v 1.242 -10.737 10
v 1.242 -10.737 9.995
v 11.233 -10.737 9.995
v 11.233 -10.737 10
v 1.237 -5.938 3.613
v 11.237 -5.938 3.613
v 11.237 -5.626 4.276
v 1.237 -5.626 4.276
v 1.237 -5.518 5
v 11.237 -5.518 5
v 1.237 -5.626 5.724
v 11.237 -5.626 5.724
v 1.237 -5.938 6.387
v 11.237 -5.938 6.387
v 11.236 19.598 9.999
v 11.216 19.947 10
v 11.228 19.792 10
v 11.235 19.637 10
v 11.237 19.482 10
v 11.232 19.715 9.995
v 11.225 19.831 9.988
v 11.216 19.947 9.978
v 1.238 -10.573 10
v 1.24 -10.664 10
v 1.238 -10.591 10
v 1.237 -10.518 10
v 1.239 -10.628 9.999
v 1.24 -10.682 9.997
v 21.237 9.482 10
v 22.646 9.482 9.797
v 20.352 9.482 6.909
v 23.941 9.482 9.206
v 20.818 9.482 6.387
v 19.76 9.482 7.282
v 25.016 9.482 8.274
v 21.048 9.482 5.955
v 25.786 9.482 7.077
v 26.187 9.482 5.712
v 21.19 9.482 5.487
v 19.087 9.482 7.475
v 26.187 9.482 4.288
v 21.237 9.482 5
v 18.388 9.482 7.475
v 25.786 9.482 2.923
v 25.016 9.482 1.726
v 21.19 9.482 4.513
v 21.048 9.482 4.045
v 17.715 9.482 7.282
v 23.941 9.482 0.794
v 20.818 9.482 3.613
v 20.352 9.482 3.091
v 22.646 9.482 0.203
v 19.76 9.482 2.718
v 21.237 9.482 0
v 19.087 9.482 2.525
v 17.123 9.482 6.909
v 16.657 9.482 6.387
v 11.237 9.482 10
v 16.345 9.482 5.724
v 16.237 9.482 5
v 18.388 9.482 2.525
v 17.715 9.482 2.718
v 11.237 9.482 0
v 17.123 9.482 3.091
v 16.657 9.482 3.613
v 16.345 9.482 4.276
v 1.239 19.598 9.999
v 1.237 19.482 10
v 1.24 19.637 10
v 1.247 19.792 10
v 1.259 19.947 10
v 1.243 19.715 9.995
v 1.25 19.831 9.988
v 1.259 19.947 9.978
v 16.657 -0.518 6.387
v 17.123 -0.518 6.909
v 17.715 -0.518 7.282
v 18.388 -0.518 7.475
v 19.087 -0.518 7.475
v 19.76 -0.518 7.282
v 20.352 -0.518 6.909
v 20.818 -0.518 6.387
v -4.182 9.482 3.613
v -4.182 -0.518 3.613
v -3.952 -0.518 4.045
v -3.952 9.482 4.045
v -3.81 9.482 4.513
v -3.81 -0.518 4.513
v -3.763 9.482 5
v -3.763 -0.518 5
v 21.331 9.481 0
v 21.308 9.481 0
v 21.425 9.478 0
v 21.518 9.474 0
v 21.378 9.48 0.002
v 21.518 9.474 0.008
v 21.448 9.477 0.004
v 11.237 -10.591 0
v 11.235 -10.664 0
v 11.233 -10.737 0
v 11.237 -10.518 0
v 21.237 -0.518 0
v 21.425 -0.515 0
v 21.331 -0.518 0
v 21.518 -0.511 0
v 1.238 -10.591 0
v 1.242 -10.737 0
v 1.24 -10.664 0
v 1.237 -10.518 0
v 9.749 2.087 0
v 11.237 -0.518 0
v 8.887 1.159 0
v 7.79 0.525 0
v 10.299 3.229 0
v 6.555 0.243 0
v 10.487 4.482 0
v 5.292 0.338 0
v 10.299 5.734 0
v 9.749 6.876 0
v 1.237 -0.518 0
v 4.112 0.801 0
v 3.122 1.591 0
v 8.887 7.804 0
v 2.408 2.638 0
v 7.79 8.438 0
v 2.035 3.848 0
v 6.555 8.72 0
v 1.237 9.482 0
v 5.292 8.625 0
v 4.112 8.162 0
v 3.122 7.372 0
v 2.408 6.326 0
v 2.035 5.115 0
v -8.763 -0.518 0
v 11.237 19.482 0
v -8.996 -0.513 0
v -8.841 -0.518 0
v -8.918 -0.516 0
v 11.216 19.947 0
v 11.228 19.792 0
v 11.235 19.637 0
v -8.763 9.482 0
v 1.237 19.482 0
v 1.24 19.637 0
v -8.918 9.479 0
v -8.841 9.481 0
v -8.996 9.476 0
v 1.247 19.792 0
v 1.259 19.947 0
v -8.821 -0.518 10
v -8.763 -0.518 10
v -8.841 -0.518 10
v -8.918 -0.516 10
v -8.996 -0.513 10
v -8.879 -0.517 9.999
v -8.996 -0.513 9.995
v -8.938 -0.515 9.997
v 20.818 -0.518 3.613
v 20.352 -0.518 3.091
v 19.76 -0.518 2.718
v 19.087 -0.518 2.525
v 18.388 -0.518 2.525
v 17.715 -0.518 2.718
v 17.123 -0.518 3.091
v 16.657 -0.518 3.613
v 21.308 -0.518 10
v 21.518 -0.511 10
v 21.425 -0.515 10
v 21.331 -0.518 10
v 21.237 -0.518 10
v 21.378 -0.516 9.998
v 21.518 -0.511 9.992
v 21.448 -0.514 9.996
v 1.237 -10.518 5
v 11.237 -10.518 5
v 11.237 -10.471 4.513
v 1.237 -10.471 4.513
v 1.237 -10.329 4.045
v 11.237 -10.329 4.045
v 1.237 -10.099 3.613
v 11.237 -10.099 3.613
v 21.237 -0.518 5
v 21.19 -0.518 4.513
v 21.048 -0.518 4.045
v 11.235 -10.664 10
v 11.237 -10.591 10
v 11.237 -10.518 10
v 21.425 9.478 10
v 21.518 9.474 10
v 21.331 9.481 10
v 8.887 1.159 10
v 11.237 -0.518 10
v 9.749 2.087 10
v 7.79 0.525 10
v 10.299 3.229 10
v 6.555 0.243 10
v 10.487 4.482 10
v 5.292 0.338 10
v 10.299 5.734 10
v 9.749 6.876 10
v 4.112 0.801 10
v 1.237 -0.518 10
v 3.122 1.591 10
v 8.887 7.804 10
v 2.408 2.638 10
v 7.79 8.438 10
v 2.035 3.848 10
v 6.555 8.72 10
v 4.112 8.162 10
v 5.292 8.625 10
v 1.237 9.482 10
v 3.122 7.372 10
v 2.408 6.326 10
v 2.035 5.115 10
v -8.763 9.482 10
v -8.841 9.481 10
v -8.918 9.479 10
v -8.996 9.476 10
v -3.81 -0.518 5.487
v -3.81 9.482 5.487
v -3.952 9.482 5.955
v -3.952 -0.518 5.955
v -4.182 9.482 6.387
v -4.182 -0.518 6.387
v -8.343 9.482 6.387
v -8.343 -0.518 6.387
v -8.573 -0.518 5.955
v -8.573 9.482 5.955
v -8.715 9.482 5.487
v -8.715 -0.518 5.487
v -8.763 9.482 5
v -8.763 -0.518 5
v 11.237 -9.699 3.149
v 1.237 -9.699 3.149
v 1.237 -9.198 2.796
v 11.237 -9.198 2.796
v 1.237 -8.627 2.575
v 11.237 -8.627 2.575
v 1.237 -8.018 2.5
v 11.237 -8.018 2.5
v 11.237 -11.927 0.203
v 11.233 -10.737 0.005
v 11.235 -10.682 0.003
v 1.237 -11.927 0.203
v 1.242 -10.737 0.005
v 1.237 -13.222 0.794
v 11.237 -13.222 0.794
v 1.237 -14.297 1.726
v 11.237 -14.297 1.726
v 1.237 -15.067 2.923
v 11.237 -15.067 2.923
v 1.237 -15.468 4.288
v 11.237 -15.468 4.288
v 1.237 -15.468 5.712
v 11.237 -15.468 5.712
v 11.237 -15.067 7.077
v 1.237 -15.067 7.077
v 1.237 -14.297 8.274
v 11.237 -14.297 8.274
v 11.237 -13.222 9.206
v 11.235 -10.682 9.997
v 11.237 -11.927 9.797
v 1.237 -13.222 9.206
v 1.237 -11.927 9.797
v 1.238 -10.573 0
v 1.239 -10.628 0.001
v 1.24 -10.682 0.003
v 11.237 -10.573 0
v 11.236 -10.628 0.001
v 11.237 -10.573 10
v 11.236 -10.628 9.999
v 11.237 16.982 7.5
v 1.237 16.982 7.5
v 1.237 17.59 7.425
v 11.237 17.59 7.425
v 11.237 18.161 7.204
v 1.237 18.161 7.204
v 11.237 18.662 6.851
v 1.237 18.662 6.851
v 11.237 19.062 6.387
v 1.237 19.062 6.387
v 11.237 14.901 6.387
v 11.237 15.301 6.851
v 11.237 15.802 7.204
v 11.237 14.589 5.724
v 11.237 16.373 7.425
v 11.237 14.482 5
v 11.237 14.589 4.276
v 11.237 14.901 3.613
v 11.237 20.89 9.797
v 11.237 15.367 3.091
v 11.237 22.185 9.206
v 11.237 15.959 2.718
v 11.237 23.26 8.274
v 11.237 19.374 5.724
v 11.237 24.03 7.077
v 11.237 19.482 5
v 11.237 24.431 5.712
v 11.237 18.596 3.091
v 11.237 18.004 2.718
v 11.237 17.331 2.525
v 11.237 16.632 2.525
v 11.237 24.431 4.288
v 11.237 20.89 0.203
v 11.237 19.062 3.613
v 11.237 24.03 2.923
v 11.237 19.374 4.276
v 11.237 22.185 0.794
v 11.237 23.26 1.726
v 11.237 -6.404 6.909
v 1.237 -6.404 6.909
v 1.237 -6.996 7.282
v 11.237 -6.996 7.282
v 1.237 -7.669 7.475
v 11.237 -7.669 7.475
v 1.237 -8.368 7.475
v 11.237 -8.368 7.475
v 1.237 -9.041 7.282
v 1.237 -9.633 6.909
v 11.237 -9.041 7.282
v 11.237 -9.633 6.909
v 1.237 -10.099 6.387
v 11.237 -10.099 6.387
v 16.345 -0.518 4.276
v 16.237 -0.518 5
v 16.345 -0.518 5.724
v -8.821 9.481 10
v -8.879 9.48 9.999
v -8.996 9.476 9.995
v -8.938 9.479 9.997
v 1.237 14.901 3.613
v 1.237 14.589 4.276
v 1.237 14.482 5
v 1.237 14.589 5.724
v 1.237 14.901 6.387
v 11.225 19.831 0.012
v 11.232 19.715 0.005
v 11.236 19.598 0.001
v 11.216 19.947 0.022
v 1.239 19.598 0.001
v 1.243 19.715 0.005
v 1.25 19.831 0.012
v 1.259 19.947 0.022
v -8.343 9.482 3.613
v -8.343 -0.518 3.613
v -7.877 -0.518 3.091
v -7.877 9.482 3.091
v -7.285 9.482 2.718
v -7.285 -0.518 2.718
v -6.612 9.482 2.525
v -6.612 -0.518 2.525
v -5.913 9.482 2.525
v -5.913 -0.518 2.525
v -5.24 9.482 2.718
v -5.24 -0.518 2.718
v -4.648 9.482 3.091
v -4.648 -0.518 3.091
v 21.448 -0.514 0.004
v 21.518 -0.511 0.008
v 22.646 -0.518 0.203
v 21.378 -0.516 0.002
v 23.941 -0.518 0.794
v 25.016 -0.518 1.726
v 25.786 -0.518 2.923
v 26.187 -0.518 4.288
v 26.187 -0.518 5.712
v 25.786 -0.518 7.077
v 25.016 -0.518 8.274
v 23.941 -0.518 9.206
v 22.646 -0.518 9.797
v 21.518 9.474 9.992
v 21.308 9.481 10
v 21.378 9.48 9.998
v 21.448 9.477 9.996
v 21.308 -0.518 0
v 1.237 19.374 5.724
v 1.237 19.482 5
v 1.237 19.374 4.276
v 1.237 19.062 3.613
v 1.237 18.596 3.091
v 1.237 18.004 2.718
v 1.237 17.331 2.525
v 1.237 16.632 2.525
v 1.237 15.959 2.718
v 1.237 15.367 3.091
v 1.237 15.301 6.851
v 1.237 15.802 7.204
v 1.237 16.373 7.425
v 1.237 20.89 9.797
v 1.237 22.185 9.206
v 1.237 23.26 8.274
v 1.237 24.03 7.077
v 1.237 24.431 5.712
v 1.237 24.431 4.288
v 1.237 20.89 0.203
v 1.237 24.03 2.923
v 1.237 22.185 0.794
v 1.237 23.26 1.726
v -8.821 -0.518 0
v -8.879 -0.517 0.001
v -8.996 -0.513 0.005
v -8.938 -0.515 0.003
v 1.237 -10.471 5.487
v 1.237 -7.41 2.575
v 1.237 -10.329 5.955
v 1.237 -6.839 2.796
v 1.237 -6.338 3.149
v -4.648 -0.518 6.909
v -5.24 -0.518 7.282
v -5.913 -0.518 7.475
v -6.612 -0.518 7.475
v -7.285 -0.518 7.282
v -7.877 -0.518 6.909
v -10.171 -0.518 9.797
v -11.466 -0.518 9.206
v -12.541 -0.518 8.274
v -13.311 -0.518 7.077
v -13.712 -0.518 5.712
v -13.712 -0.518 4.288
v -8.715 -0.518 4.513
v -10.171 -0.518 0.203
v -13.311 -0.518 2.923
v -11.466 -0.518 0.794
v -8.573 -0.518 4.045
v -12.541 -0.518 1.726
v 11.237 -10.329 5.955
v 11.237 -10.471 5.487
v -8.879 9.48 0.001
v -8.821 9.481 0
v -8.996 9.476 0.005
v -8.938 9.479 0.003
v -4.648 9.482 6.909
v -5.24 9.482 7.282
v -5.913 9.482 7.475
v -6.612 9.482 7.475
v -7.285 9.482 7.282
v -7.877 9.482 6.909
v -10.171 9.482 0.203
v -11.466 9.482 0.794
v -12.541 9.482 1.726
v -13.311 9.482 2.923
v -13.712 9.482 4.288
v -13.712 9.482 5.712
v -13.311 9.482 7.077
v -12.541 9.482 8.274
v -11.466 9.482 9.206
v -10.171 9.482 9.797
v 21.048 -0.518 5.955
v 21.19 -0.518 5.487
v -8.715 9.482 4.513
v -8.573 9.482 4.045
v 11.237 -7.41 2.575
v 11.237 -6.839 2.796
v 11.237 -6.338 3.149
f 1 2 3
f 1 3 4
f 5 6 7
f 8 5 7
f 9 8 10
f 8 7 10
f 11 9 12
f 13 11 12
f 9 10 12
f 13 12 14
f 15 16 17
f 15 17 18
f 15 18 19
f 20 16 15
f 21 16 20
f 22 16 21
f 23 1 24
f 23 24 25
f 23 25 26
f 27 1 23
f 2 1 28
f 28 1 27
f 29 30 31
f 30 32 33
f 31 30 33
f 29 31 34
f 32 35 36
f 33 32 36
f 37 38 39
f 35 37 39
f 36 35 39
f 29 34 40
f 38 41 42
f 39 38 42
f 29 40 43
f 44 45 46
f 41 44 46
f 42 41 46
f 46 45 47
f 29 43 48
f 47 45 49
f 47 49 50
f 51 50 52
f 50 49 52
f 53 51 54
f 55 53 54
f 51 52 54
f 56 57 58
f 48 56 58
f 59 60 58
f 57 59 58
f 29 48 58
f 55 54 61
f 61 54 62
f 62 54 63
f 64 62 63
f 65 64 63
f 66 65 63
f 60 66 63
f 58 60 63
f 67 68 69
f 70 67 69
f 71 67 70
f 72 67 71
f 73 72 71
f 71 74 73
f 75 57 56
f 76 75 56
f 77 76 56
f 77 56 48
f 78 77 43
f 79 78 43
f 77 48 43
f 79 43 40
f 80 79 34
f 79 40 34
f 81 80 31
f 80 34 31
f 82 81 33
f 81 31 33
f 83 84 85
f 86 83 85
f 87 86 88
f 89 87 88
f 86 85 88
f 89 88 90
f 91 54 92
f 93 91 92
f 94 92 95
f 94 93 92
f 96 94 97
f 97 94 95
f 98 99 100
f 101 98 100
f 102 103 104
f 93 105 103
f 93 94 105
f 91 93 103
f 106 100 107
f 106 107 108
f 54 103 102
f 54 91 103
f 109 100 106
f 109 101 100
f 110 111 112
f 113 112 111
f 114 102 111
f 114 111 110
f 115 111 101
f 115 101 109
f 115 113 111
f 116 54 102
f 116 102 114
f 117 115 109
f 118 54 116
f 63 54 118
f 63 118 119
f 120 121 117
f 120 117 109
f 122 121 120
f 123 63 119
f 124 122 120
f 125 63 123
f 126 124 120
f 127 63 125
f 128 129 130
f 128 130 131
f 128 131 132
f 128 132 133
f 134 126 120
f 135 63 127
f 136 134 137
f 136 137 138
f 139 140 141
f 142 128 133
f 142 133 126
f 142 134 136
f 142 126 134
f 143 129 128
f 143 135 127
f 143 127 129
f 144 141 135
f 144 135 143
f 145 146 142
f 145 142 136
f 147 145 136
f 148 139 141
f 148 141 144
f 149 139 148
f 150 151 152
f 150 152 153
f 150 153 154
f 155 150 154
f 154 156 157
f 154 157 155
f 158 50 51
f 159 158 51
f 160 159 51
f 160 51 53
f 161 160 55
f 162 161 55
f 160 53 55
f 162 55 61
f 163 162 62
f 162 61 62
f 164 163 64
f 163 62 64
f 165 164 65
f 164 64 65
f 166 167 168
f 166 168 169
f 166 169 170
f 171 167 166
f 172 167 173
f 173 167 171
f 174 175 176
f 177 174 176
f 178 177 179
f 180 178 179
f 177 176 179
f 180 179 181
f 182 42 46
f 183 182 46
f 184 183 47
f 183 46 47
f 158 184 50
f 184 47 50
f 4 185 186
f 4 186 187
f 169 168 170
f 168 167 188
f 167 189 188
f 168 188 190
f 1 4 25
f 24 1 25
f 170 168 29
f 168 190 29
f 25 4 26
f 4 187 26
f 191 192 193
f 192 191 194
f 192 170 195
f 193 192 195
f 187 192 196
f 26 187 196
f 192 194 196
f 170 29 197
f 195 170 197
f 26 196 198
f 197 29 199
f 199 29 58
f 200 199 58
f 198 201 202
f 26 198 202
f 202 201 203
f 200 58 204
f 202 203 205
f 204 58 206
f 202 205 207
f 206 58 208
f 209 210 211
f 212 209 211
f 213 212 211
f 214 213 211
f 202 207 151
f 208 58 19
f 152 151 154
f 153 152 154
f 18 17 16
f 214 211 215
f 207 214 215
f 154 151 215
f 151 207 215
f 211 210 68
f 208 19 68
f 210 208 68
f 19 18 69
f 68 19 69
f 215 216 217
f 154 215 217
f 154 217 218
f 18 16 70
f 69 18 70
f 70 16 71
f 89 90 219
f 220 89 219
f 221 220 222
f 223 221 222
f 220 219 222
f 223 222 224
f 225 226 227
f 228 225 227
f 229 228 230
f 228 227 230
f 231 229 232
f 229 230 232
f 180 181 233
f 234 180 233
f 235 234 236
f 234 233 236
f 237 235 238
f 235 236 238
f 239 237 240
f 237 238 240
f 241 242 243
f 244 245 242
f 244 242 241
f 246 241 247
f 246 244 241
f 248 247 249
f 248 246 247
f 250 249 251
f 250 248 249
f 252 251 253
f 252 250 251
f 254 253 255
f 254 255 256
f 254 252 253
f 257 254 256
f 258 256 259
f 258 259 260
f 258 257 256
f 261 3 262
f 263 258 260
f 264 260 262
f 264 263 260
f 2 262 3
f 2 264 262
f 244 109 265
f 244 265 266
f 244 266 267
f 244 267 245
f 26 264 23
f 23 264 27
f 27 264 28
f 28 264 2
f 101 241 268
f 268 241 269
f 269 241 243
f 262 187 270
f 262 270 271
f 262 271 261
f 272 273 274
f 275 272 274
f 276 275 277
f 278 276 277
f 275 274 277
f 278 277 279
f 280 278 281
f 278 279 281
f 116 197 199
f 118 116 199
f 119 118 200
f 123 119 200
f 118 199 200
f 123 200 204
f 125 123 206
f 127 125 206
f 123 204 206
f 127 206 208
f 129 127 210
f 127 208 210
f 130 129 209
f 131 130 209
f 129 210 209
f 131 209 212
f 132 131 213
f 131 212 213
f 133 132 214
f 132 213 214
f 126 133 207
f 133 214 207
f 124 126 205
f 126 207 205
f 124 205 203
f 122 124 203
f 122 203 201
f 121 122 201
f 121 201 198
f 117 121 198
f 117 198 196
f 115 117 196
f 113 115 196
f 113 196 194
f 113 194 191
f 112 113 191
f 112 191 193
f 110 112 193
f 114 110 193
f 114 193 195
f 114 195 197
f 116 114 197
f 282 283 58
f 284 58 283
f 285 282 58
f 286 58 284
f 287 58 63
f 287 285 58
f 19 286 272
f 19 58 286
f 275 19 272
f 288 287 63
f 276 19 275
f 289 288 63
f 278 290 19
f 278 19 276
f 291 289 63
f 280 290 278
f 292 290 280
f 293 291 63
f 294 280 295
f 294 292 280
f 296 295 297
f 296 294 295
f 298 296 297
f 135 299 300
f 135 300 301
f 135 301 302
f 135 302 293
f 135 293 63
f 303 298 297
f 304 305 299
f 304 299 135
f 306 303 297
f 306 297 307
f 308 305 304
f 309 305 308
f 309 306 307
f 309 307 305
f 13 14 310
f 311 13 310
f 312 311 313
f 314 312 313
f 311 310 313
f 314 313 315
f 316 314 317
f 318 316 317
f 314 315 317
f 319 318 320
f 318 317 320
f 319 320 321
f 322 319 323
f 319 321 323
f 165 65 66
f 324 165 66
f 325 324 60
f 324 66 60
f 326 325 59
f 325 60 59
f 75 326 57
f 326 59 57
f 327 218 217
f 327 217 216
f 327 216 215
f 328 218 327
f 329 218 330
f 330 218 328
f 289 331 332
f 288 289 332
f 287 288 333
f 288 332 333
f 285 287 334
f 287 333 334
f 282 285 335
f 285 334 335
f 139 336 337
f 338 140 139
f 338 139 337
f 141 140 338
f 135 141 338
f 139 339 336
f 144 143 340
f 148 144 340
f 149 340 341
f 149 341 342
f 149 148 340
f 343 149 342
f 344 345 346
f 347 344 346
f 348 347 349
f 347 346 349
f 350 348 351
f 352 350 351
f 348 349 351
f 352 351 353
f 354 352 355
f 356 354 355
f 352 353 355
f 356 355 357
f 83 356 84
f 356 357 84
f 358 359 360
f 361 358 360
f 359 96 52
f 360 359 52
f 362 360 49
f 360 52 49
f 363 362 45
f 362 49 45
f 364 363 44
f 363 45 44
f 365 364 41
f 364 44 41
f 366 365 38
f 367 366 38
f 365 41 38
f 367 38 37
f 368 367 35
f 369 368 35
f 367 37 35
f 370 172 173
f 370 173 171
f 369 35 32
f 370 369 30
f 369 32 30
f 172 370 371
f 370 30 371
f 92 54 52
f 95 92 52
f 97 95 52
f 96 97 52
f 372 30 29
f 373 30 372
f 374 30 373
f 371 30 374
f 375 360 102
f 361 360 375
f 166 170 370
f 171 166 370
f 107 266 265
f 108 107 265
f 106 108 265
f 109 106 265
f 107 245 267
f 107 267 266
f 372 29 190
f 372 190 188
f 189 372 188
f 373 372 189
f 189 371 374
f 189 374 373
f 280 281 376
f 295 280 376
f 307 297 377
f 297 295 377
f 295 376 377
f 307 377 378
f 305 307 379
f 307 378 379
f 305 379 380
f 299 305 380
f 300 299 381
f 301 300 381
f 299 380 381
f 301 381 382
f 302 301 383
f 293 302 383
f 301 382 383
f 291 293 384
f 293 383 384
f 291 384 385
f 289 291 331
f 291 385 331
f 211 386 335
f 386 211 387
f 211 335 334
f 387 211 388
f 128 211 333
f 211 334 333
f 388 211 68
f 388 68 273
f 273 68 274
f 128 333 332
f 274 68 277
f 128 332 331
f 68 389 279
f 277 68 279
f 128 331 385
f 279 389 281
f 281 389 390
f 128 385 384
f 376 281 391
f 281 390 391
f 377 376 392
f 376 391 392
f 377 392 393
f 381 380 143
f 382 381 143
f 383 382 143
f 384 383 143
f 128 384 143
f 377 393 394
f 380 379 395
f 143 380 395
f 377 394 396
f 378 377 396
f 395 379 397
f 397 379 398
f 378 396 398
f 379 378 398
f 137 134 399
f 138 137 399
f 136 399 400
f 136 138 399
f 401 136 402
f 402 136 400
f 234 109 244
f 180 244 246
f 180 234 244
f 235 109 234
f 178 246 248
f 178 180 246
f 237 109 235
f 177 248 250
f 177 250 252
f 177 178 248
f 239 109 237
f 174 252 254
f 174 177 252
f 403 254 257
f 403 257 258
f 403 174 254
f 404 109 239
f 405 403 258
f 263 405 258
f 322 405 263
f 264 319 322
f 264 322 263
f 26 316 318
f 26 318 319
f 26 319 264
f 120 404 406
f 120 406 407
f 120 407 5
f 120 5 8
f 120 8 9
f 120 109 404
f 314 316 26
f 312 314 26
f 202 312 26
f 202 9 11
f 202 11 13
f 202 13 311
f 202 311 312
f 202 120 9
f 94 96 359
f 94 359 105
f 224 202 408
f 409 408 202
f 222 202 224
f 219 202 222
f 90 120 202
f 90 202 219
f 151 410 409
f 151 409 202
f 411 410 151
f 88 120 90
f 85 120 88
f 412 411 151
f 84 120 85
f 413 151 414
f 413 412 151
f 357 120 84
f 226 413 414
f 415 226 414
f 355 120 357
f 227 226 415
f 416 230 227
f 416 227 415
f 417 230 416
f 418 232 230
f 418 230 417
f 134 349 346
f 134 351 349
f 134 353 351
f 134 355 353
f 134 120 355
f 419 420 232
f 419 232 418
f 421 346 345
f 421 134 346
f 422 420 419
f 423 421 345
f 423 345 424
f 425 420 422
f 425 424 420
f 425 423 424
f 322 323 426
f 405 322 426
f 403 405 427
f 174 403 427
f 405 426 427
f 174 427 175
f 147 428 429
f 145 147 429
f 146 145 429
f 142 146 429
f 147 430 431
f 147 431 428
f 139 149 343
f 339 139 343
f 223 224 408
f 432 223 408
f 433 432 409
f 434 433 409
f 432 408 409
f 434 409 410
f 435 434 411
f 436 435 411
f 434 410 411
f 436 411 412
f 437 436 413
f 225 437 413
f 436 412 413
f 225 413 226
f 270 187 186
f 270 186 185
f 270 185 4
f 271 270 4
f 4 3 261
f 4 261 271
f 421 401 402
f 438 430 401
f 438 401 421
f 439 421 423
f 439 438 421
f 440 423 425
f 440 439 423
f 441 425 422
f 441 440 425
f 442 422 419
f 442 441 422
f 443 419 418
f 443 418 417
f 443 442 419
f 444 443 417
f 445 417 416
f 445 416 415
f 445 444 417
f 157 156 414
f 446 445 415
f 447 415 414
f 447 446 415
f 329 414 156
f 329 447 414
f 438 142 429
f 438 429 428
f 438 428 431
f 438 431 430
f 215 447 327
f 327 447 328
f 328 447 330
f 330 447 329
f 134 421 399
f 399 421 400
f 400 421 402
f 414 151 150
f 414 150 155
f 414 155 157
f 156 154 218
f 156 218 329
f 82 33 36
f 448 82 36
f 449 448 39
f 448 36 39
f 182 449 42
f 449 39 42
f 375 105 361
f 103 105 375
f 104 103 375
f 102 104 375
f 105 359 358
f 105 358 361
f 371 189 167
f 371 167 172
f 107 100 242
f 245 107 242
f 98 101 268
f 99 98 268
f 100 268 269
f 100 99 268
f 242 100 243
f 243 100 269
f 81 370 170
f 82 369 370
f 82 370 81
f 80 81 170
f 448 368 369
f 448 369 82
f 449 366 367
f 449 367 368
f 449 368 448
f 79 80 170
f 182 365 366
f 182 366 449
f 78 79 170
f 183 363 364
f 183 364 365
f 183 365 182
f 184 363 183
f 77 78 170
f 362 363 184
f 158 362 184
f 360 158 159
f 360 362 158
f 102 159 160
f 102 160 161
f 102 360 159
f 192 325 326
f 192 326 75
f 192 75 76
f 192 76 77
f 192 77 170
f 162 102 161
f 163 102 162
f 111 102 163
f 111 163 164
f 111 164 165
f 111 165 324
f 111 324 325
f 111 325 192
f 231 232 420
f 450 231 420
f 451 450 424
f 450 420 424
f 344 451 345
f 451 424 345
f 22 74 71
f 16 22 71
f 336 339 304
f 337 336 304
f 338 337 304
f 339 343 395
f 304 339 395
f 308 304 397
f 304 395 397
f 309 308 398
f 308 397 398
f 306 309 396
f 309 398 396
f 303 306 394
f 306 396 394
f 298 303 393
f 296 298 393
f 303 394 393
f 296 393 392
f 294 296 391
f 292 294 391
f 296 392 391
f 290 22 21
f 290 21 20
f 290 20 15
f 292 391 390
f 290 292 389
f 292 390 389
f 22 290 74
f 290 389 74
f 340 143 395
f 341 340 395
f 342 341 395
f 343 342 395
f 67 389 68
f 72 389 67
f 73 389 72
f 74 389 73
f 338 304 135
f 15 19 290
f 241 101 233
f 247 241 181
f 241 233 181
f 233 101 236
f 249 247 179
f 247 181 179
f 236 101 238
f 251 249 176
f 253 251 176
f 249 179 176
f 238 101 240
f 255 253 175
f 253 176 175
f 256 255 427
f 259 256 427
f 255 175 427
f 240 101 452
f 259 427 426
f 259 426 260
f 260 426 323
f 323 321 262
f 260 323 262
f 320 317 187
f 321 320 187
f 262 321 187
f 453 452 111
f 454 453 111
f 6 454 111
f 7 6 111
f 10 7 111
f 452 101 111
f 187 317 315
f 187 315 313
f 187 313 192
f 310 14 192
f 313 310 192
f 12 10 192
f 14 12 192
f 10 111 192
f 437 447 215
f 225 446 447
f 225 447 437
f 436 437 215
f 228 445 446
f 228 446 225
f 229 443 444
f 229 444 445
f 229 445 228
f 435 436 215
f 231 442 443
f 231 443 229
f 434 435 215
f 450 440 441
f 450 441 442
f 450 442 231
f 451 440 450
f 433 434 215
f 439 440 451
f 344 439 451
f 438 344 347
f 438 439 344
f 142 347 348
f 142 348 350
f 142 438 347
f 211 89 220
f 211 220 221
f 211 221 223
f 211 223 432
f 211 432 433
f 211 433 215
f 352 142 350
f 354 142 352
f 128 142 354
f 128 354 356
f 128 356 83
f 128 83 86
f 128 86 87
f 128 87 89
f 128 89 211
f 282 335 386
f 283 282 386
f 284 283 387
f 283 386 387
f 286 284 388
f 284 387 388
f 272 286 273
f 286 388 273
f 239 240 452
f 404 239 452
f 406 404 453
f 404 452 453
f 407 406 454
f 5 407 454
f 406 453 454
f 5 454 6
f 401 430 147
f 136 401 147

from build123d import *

# Parameters (mm, degrees)
EXTRUDE_1_DEPTH     = 10
CUT_EXTRUDE_1_DEPTH = 10
CUT_EXTRUDE_2_DEPTH = 10
CUT_EXTRUDE_3_DEPTH = 10
CUT_EXTRUDE_4_DEPTH = 10
CUT_EXTRUDE_5_DEPTH = 10
SKETCH_8_R          = 4.25
SKETCH_8_R_2        = 3
CUT_EXTRUDE_6_DEPTH = 38.252521334
SKETCH_9_W          = 10
SKETCH_9_H          = 4.534386639
CUT_EXTRUDE_7_DEPTH = 37.39158883
EXTRUDE_2_DEPTH     = 10
SKETCH_12_W         = 10
SKETCH_12_H         = 4.781714723
CUT_EXTRUDE_8_DEPTH = 37.39158883
EXTRUDE_3_DEPTH     = 10
SKETCH_15_W         = 4.719326728
SKETCH_15_H         = 10
SKETCH_15_W_2       = 4.766273505
CUT_EXTRUDE_9_DEPTH = 38.595247149
EXTRUDE_4_DEPTH     = 10


with BuildPart() as part:
    # 草图2 → 凸台-拉伸1 (new body)
    with BuildSketch(Plane.XY):
        with BuildLine():
            Line((1.237427622, 9.481579556), (1.237427622, 19.481579556))
            ThreePointArc((1.237427622, 19.481579556), (6.237427622, 24.481579556), (11.237427622, 19.481579556))
            Line((11.237427622, 19.481579556), (11.237427622, 9.481579556))
            Line((11.237427622, 9.481579556), (21.237427622, 9.481579556))
            ThreePointArc((21.237427622, 9.481579556), (26.237427622, 4.481579556), (21.237427622, -0.518420444))
            Line((21.237427622, -0.518420444), (11.237427622, -0.518420444))
            Line((11.237427622, -0.518420444), (11.237427622, -10.518420444))
            ThreePointArc((11.237427622, -10.518420444), (6.237427622, -15.518420444), (1.237427622, -10.518420444))
            Line((1.237427622, -10.518420444), (1.237427622, -0.518420444))
            Line((1.237427622, -0.518420444), (-8.762572378, -0.518420444))
            ThreePointArc((-8.762572378, -0.518420444), (-13.762572378, 4.481579556), (-8.762572378, 9.481579556))
            Line((-8.762572378, 9.481579556), (1.237427622, 9.481579556))
        make_face()
    extrude(amount=EXTRUDE_1_DEPTH)

    # 草图3 → 切除-拉伸1 (cut)
    with BuildSketch(Plane.XZ.offset(0.518420444)):
        with BuildLine():
            ThreePointArc((-8.342698114, 3.613249509), (-6.262572378, 2.5), (-4.182446643, 3.613249509))
            Line((-4.182446643, 3.613249509), (-6.262572378, 5))
            Line((-6.262572378, 5), (-8.342698114, 3.613249509))
        make_face()
        with BuildLine():
            Line((-6.262572378, 5), (-4.182446643, 3.613249509))
            ThreePointArc((-4.182446643, 3.613249509), (-3.869842312, 4.275539628), (-3.762572378, 5))
            ThreePointArc((-3.762572378, 5), (-3.869842312, 5.724460372), (-4.182446643, 6.386750491))
            Line((-4.182446643, 6.386750491), (-6.262572378, 5))
        make_face()
        with BuildLine():
            ThreePointArc((-8.342698114, 6.386750491), (-8.655302445, 5.724460372), (-8.762572378, 5))
            ThreePointArc((-8.762572378, 5), (-8.655302445, 4.275539628), (-8.342698114, 3.613249509))
            Line((-8.342698114, 3.613249509), (-6.262572378, 5))
            Line((-6.262572378, 5), (-8.342698114, 6.386750491))
        make_face()
        with BuildLine():
            Line((-6.262572378, 5), (-4.182446643, 6.386750491))
            ThreePointArc((-4.182446643, 6.386750491), (-6.262572378, 7.5), (-8.342698114, 6.386750491))
            Line((-8.342698114, 6.386750491), (-6.262572378, 5))
        make_face()
    extrude(amount=-CUT_EXTRUDE_1_DEPTH, mode=Mode.SUBTRACT)

    # 草图4 → 切除-拉伸2 (cut)
    with BuildSketch(Plane(origin=(11.237427622, 0, 0), x_dir=(0, 0, -1), z_dir=(1, 0, 0))):
        with BuildLine():
            ThreePointArc((-6.386750491, -10.09854618), (-5.724460372, -10.411150511), (-5, -10.518420444))
            ThreePointArc((-5, -10.518420444), (-4.275539628, -10.411150511), (-3.613249509, -10.09854618))
            Line((-3.613249509, -10.09854618), (-5, -8.018420444))
            Line((-5, -8.018420444), (-6.386750491, -10.09854618))
        make_face()
        with BuildLine():
            Line((-5, -8.018420444), (-3.613249509, -10.09854618))
            ThreePointArc((-3.613249509, -10.09854618), (-2.795813503, -9.198065258), (-2.5, -8.018420444))
            ThreePointArc((-2.5, -8.018420444), (-2.795813503, -6.83877563), (-3.613249509, -5.938294708))
            Line((-3.613249509, -5.938294708), (-5, -8.018420444))
        make_face()
        with BuildLine():
            Line((-5, -8.018420444), (-3.613249509, -5.938294708))
            ThreePointArc((-3.613249509, -5.938294708), (-5, -5.518420444), (-6.386750491, -5.938294708))
            Line((-6.386750491, -5.938294708), (-5, -8.018420444))
        make_face()
        with BuildLine():
            ThreePointArc((-6.386750491, -5.938294708), (-7.5, -8.018420444), (-6.386750491, -10.09854618))
            Line((-6.386750491, -10.09854618), (-5, -8.018420444))
            Line((-5, -8.018420444), (-6.386750491, -5.938294708))
        make_face()
    extrude(amount=-CUT_EXTRUDE_2_DEPTH, mode=Mode.SUBTRACT)

    # 草图5 → 切除-拉伸3 (cut)
    with BuildSketch(Plane(origin=(0, 9.481579556, 0), x_dir=(1, 0, 0), z_dir=(0, 1, 0))):
        with BuildLine():
            ThreePointArc((20.817553357, -6.386750491), (21.130157688, -5.724460372), (21.237427622, -5))
            ThreePointArc((21.237427622, -5), (21.130157688, -4.275539628), (20.817553357, -3.613249509))
            Line((20.817553357, -3.613249509), (18.737427622, -5))
            Line((18.737427622, -5), (20.817553357, -6.386750491))
        make_face()
        with BuildLine():
            Line((18.737427622, -5), (20.817553357, -3.613249509))
            ThreePointArc((20.817553357, -3.613249509), (18.737427622, -2.5), (16.657301886, -3.613249509))
            Line((16.657301886, -3.613249509), (18.737427622, -5))
        make_face()
        with BuildLine():
            Line((18.737427622, -5), (16.657301886, -3.613249509))
            ThreePointArc((16.657301886, -3.613249509), (16.237427622, -5), (16.657301886, -6.386750491))
            Line((16.657301886, -6.386750491), (18.737427622, -5))
        make_face()
        with BuildLine():
            ThreePointArc((16.657301886, -6.386750491), (18.737427622, -7.5), (20.817553357, -6.386750491))
            Line((20.817553357, -6.386750491), (18.737427622, -5))
            Line((18.737427622, -5), (16.657301886, -6.386750491))
        make_face()
    extrude(amount=-CUT_EXTRUDE_3_DEPTH, mode=Mode.SUBTRACT)

    # 草图6 → 切除-拉伸4 (cut)
    with BuildSketch(Plane.ZY.offset(-1.237427622)):
        with BuildLine():
            ThreePointArc((6.386750491, 19.061705292), (5, 19.481579556), (3.613249509, 19.061705292))
            Line((3.613249509, 19.061705292), (5, 16.981579556))
            Line((5, 16.981579556), (6.386750491, 19.061705292))
        make_face()
        with BuildLine():
            Line((5, 16.981579556), (3.613249509, 19.061705292))
            ThreePointArc((3.613249509, 19.061705292), (2.5, 16.981579556), (3.613249509, 14.90145382))
            Line((3.613249509, 14.90145382), (5, 16.981579556))
        make_face()
        with BuildLine():
            Line((6.386750491, 14.90145382), (5, 16.981579556))
            Line((5, 16.981579556), (3.613249509, 14.90145382))
            ThreePointArc((3.613249509, 14.90145382), (5, 14.481579556), (6.386750491, 14.90145382))
        make_face()
        with BuildLine():
            Line((6.386750491, 19.061705292), (5, 16.981579556))
            Line((5, 16.981579556), (6.386750491, 14.90145382))
            ThreePointArc((6.386750491, 14.90145382), (7.204186497, 15.801934742), (7.5, 16.981579556))
            ThreePointArc((7.5, 16.981579556), (7.204186497, 18.16122437), (6.386750491, 19.061705292))
        make_face()
    extrude(amount=-CUT_EXTRUDE_4_DEPTH, mode=Mode.SUBTRACT)

    # 草图7 → 切除-拉伸5 (cut)
    with BuildSketch(Plane.XY.offset(10)):
        with BuildLine():
            ThreePointArc((9.237427622, 4.481579556), (9.009066219, 5.629629853), (8.358747965, 6.602899899))
            Line((8.358747965, 6.602899899), (6.237427622, 4.481579556))
            Line((6.237427622, 4.481579556), (8.358747965, 2.360259212))
            ThreePointArc((8.358747965, 2.360259212), (9.009066219, 3.333529259), (9.237427622, 4.481579556))
        make_face()
        with BuildLine():
            Line((6.237427622, 4.481579556), (8.358747965, 6.602899899))
            ThreePointArc((8.358747965, 6.602899899), (6.237427622, 7.481579556), (4.116107278, 6.602899899))
            Line((4.116107278, 6.602899899), (6.237427622, 4.481579556))
        make_face()
        with BuildLine():
            Line((8.358747965, 2.360259212), (6.237427622, 4.481579556))
            Line((6.237427622, 4.481579556), (4.116107278, 2.360259212))
            ThreePointArc((4.116107278, 2.360259212), (6.237427622, 1.481579556), (8.358747965, 2.360259212))
        make_face()
        with BuildLine():
            Line((4.116107278, 2.360259212), (6.237427622, 4.481579556))
            Line((6.237427622, 4.481579556), (4.116107278, 6.602899899))
            ThreePointArc((4.116107278, 6.602899899), (3.237427622, 4.481579556), (4.116107278, 2.360259212))
        make_face()
    extrude(amount=-CUT_EXTRUDE_5_DEPTH, mode=Mode.SUBTRACT)

    # 草图8 → 切除-拉伸6 (cut, through all)
    with BuildSketch(Plane.XY.offset(10)):
        with Locations((6.237427622, 4.481579556)):
            Circle(SKETCH_8_R)
        with Locations((6.237427622, 4.481579556)):
            Circle(SKETCH_8_R_2, mode=Mode.SUBTRACT)
    extrude(amount=-CUT_EXTRUDE_6_DEPTH, mode=Mode.SUBTRACT)

    # 草图9 → 切除-拉伸7 (cut, through all)
    with BuildSketch(Plane.ZY.offset(-1.237427622)):
        with Locations((5, 22.214386237)):
            Rectangle(SKETCH_9_W, SKETCH_9_H)
    extrude(amount=-CUT_EXTRUDE_7_DEPTH, mode=Mode.SUBTRACT)

    # 草图10 → 凸台-拉伸2 (add)
    with BuildSketch(Plane.ZY.offset(-1.237427622)):
        with BuildLine():
            Line((10, 19.481579556), (5, 19.481579556))
            Line((5, 19.481579556), (0, 19.481579556))
            ThreePointArc((0, 19.481579556), (5, 24.481579556), (10, 19.481579556))
        make_face()
    extrude(amount=-EXTRUDE_2_DEPTH)

    # 草图12 → 切除-拉伸8 (cut, through all)
    with BuildSketch(Plane.ZY.offset(-1.237427622)):
        with Locations((5, -13.127563083)):
            Rectangle(SKETCH_12_W, SKETCH_12_H)
    extrude(amount=-CUT_EXTRUDE_8_DEPTH, mode=Mode.SUBTRACT)

    # 草图13 → 凸台-拉伸3 (add)
    with BuildSketch(Plane.ZY.offset(-1.237427622)):
        with BuildLine():
            Line((10, -10.518420444), (5, -10.518420444))
            Line((5, -10.518420444), (0, -10.518420444))
            ThreePointArc((0, -10.518420444), (5, -15.518420444), (10, -10.518420444))
        make_face()
    extrude(amount=-EXTRUDE_3_DEPTH)

    # 草图15 → 切除-拉伸9 (cut, through all)
    with BuildSketch(Plane(origin=(0, 9.481579556, 0), x_dir=(1, 0, 0), z_dir=(0, 1, 0))):
        with Locations((23.877764258, -5)):
            Rectangle(SKETCH_15_W, SKETCH_15_H)
        with Locations((-11.379435626, -5)):
            Rectangle(SKETCH_15_W_2, SKETCH_15_H)
    extrude(amount=-CUT_EXTRUDE_9_DEPTH, mode=Mode.SUBTRACT)

    # 草图16 → 凸台-拉伸4 (add)
    with BuildSketch(Plane(origin=(0, 9.481579556, 0), x_dir=(1, 0, 0), z_dir=(0, 1, 0))):
        with BuildLine():
            Line((21.237427622, -5), (21.237427622, 0))
            ThreePointArc((21.237427622, 0), (26.237427622, -5), (21.237427622, -10))
            Line((21.237427622, -10), (21.237427622, -5))
        make_face()
        with BuildLine():
            Line((-8.762572378, -5), (-8.762572378, 0))
            ThreePointArc((-8.762572378, 0), (-13.762572378, -5), (-8.762572378, -10))
            Line((-8.762572378, -10), (-8.762572378, -5))
        make_face()
    extrude(amount=-EXTRUDE_4_DEPTH)


solid = part.part
